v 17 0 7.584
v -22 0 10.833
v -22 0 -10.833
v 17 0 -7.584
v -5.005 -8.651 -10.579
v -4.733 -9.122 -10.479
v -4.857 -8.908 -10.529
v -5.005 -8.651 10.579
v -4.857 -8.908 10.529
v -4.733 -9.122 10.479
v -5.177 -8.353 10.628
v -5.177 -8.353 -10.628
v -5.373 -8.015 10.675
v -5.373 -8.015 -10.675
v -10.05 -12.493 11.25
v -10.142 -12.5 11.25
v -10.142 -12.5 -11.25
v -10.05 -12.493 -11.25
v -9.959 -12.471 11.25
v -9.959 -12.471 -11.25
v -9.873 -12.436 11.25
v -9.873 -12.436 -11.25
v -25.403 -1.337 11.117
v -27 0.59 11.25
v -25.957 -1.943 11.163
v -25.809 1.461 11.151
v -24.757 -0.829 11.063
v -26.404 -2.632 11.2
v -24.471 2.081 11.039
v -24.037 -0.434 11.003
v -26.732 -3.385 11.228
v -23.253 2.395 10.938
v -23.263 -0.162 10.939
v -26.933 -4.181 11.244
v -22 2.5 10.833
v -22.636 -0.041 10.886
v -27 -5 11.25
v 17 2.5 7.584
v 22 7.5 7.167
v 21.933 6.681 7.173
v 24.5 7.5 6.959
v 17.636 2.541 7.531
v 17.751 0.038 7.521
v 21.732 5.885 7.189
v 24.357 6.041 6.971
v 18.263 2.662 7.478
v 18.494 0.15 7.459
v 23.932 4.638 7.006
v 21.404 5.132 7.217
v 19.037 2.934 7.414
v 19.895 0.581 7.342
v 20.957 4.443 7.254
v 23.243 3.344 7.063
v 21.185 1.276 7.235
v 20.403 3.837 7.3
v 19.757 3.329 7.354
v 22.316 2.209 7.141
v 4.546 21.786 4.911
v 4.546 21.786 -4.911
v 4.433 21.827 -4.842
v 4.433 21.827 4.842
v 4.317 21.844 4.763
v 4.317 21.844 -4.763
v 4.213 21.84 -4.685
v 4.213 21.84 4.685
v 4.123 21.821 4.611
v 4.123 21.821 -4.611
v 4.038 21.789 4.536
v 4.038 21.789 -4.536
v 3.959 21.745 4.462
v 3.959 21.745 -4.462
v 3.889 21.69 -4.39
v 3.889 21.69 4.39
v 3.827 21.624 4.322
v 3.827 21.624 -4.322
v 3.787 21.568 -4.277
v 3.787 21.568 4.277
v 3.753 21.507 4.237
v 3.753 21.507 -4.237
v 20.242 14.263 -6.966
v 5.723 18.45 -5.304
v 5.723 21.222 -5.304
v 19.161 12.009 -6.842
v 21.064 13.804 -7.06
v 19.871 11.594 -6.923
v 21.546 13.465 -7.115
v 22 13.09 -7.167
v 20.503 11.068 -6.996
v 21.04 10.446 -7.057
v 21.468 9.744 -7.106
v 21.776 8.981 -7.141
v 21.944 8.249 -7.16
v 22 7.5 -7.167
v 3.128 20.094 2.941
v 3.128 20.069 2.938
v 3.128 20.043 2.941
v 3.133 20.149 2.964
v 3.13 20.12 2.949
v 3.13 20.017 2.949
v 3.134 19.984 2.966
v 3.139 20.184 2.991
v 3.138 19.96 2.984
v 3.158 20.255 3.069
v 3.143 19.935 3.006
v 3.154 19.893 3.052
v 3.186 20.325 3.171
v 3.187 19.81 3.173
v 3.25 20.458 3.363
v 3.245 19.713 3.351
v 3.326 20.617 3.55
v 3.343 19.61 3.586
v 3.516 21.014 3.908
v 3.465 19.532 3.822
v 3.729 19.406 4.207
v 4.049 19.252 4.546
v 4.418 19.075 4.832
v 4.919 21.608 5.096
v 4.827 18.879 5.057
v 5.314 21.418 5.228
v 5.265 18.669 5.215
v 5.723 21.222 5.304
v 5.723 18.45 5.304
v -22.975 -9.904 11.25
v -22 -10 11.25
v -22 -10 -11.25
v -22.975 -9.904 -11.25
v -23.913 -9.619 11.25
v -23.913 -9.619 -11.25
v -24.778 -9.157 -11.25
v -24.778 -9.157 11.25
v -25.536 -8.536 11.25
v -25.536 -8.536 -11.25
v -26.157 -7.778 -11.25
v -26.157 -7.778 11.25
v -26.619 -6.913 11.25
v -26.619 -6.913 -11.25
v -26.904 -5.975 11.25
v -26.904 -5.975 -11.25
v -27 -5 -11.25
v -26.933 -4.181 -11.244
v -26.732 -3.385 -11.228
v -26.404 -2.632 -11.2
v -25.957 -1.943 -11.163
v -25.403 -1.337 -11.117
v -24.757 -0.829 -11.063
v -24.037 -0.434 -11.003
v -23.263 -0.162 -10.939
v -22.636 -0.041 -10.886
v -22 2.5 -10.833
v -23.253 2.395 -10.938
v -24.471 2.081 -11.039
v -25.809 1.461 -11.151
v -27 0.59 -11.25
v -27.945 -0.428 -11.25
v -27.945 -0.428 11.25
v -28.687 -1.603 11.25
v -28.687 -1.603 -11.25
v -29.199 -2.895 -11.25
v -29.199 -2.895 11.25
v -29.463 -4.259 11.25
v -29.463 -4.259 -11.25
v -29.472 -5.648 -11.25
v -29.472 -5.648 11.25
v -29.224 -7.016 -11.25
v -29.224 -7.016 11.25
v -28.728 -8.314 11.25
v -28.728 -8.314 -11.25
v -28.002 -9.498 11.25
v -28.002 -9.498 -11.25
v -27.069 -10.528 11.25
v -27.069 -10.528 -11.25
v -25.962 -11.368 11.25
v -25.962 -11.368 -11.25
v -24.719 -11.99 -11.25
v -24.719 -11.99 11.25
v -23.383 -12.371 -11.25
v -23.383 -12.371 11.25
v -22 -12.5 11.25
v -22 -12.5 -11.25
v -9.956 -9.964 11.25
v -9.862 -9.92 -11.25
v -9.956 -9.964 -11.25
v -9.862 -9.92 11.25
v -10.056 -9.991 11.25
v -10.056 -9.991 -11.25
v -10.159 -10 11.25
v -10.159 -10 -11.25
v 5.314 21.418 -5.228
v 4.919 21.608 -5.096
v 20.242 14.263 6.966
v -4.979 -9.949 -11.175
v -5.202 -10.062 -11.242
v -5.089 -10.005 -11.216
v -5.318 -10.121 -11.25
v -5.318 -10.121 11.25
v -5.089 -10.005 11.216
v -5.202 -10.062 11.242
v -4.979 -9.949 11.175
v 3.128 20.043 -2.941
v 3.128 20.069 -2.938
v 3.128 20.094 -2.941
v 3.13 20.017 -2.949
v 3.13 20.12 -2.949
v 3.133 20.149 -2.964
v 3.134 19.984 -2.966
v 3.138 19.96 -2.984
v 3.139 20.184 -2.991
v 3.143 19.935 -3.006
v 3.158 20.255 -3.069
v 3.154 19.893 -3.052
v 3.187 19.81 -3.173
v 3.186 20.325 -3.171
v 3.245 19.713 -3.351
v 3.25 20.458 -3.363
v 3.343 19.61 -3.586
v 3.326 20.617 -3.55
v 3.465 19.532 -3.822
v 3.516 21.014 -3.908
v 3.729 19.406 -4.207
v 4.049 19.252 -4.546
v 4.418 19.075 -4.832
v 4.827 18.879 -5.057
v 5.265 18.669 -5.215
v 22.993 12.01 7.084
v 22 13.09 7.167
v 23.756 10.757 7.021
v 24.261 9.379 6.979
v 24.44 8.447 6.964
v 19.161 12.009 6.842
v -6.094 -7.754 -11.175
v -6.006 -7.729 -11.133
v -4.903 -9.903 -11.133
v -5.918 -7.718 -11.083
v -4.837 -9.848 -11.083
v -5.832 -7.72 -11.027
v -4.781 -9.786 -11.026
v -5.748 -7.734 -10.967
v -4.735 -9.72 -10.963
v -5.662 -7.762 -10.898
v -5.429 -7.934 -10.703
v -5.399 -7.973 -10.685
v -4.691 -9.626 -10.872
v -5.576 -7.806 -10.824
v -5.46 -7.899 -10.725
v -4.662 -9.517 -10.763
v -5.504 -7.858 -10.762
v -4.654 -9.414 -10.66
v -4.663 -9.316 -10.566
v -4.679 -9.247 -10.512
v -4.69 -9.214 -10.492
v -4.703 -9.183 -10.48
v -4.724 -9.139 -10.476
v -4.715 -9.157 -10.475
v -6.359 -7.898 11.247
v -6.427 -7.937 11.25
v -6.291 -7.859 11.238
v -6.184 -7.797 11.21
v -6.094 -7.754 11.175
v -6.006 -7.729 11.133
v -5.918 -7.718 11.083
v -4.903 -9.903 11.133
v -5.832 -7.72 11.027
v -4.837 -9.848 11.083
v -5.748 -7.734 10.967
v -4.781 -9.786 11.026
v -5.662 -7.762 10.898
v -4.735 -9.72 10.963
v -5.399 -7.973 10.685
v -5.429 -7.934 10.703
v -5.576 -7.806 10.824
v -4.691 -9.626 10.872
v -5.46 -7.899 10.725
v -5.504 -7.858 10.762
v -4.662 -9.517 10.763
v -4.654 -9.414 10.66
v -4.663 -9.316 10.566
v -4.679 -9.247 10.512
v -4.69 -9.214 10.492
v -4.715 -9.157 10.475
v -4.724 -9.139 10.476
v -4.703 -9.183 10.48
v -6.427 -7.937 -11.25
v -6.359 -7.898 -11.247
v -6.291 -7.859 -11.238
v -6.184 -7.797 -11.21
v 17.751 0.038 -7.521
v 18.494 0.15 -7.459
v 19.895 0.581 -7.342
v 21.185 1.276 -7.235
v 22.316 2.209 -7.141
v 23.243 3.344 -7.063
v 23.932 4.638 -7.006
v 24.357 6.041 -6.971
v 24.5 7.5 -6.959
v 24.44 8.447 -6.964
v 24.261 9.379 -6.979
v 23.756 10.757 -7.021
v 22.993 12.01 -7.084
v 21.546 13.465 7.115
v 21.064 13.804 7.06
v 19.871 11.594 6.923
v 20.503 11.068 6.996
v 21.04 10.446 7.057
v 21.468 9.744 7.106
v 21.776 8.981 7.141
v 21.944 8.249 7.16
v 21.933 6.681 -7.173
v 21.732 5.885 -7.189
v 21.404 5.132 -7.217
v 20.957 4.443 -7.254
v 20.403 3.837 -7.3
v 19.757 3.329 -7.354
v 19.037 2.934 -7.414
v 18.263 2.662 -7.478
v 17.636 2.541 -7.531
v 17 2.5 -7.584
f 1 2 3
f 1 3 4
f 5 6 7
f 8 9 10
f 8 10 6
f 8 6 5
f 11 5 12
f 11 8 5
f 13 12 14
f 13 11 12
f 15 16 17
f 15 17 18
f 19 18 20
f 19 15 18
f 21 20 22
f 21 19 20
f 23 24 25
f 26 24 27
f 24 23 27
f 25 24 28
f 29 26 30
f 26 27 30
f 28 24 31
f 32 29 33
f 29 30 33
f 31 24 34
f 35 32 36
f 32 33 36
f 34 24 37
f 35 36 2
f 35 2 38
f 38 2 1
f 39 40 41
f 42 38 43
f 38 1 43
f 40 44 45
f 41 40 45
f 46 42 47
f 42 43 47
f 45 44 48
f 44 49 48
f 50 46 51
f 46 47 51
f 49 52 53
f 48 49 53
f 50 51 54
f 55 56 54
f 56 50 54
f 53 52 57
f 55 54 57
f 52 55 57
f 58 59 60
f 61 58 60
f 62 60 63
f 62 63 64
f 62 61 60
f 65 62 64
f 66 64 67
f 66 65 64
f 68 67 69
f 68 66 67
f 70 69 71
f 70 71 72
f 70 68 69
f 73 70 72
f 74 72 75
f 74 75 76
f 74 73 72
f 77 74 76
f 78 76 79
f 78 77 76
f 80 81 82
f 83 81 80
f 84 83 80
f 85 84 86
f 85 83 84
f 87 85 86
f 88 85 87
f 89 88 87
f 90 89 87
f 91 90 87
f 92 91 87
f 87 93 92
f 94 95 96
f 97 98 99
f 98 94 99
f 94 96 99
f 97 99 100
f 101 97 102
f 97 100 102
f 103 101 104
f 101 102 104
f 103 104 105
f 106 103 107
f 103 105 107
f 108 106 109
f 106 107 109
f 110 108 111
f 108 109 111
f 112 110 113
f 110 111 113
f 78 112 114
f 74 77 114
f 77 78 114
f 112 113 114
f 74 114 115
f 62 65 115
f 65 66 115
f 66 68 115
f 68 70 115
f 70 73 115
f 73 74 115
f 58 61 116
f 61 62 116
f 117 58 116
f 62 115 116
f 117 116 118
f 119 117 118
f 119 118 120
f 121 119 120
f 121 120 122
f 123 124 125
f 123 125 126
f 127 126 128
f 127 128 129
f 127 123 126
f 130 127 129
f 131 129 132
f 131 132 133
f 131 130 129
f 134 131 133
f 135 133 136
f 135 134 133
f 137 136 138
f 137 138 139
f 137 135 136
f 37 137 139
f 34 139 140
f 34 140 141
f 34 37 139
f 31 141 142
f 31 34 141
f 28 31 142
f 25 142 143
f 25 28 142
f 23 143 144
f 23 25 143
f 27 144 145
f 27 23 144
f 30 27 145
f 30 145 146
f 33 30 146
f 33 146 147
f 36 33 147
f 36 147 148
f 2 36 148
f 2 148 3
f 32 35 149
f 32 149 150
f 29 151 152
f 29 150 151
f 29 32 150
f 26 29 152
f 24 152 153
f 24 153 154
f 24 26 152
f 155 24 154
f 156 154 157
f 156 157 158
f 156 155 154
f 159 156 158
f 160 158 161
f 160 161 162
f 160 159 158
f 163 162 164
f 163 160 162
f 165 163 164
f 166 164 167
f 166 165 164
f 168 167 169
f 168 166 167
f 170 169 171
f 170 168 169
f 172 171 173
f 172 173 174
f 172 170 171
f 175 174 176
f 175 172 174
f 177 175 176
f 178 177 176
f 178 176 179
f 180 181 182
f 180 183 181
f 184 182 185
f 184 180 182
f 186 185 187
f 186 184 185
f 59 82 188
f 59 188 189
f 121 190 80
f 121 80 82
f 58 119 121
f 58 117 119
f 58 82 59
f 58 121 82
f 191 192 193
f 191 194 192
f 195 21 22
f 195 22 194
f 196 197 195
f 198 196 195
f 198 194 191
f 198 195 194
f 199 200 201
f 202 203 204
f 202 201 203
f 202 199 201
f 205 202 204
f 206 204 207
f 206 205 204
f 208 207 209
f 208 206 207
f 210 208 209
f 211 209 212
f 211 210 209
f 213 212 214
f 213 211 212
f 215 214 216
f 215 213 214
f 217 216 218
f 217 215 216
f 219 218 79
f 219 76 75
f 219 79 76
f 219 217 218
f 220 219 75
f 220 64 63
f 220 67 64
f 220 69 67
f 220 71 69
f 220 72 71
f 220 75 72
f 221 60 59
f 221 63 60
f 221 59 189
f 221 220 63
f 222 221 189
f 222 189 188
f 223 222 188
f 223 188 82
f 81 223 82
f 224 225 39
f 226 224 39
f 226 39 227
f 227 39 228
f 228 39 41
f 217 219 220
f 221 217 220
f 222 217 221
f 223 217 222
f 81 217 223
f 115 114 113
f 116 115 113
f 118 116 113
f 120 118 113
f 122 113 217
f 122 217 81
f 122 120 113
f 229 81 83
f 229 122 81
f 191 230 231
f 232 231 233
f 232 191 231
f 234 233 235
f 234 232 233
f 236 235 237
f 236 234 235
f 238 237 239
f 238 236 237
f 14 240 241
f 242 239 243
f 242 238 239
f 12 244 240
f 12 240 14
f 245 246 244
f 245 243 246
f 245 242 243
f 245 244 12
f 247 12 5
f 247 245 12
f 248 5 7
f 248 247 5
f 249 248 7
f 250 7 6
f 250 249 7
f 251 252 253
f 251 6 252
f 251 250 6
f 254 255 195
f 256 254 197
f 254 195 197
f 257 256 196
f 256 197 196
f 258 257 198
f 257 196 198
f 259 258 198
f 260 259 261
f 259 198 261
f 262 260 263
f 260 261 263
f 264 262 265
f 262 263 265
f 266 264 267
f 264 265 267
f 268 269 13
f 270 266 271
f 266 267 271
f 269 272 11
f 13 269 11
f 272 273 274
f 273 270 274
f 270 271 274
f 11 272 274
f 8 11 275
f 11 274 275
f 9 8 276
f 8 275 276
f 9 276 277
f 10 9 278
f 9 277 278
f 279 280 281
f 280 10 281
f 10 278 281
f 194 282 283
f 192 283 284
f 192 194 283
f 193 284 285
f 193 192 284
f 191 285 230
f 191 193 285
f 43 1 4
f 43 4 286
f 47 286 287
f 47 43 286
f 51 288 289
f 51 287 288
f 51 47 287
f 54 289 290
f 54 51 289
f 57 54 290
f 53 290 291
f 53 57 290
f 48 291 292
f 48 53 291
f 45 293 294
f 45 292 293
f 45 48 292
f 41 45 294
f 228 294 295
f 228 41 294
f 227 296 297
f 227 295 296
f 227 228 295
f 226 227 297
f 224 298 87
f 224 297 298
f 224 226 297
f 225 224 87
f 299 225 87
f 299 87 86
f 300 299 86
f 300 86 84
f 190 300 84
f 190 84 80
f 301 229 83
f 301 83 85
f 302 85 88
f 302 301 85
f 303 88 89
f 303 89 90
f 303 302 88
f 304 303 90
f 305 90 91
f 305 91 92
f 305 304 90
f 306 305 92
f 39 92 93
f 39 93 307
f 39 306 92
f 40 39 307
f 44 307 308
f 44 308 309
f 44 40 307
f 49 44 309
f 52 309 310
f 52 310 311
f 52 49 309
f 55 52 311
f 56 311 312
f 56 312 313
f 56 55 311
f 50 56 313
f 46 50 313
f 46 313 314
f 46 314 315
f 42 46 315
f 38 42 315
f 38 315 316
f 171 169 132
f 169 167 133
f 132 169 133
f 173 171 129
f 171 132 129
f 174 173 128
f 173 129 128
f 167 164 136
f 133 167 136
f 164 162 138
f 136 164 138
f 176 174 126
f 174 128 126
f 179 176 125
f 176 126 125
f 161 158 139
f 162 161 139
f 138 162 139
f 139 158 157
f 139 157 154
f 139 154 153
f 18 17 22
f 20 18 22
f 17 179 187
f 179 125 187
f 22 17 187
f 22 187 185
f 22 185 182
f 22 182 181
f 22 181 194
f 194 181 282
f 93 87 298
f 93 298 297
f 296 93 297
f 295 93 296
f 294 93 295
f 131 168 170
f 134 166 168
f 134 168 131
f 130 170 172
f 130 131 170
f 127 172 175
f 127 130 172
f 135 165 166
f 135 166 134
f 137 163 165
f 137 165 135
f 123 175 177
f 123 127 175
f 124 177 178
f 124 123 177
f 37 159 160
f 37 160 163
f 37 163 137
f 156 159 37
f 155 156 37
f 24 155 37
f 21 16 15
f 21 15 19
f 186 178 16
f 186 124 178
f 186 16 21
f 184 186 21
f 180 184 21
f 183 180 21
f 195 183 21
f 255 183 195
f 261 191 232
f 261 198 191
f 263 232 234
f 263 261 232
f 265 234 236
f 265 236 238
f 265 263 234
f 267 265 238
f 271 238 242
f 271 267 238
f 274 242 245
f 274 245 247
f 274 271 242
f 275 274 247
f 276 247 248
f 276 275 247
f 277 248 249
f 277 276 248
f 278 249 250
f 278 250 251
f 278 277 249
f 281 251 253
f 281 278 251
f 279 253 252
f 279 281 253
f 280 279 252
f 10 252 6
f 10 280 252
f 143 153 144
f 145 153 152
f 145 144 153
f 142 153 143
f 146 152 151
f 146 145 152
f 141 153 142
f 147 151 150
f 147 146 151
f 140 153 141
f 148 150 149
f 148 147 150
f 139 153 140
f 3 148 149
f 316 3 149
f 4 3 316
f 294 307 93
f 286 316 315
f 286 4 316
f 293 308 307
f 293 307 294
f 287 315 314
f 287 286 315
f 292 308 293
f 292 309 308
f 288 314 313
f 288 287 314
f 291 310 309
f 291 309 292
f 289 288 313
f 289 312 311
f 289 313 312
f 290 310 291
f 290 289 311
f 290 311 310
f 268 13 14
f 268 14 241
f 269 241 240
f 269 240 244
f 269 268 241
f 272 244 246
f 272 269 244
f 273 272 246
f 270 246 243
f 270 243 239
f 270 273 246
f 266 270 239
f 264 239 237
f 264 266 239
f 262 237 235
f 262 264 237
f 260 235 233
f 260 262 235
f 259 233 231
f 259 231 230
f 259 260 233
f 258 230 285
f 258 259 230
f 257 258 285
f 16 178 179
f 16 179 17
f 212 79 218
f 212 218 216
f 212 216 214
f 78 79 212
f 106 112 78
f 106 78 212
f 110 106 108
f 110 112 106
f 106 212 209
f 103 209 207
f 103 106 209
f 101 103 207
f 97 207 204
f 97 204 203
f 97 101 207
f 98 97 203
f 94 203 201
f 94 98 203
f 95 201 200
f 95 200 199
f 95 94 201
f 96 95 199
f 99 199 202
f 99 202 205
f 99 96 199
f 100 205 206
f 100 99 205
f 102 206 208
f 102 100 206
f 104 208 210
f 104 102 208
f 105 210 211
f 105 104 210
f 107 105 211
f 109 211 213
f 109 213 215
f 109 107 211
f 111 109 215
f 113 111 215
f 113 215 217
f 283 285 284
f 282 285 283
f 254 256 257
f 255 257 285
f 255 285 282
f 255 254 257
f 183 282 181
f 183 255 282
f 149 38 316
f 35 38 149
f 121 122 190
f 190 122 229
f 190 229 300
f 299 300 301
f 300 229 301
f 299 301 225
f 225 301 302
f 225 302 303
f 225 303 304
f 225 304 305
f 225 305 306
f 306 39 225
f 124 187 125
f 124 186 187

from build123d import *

# Parameters (mm, degrees)
F1_DEPTH  = 11.25
F4_DEPTH  = 12.5
F8_DEPTH  = 25
F9_DEPTH  = 5
F10_DEPTH = 5


with BuildPart() as f1:
    # F0 (on Top) → F1 (new body)
    with BuildSketch(Plane.XY):
        with BuildLine():
            Line((-22, 0), (0, 0))
            Line((0, 0), (17, 0))
            ThreePointArc((17, 0), (24.313496, 5.837842), (20.24165, 14.263261))
            Line((20.24165, 14.263261), (4.545653, 21.786397))
            ThreePointArc((4.545653, 21.786397), (4.091542, 21.811059), (3.752999, 21.507393))
            Line((3.752999, 21.507393), (3.186098, 20.324631))
            ThreePointArc((3.186098, 20.324631), (3.161436, 19.87052), (3.465103, 19.531977))
            Line((3.465103, 19.531977), (19.1611, 12.008841))
            ThreePointArc((19.1611, 12.008841), (21.875664, 6.391894), (17, 2.5))
            Line((17, 2.5), (-22, 2.5))
            ThreePointArc((-22, 2.5), (-29.5, -5), (-22, -12.5))
            Line((-22, -12.5), (-10.142284, -12.5))
            ThreePointArc((-10.142284, -12.5), (-10.003912, -12.483664), (-9.873148, -12.435554))
            Line((-9.873148, -12.435554), (-4.978775, -9.949009))
            ThreePointArc((-4.978775, -9.949009), (-4.678281, -9.588354), (-4.73332, -9.122157))
            Line((-4.73332, -9.122157), (-5.372774, -8.014591))
            ThreePointArc((-5.372774, -8.014591), (-5.733575, -7.737739), (-6.184464, -7.797099))
            Line((-6.184464, -7.797099), (-9.862116, -9.920392))
            ThreePointArc((-9.862116, -9.920392), (-10.005425, -9.979753), (-10.159215, -10))
            Line((-10.159215, -10), (-22, -10))
            ThreePointArc((-22, -10), (-27, -5), (-22, 0))
        make_face()
    extrude(amount=F1_DEPTH)

    # F3 (on offset) → F4 (cut)
    with BuildSketch(Plane.XZ.offset(5)):
        Polygon((27.003047, 6.75), (27.003047, 15.756967), (-27, 11.25), align=None)
    extrude(amount=-F4_DEPTH, mode=Mode.SUBTRACT)

    # F6 (on offset) → F8 (cut)
    with BuildSketch(Plane.XZ.offset(-7.5)):
        with BuildLine():
            Line((22, 7.166897), (24.5, 6.958576))
            Line((24.5, 6.958576), (25.517887, 14.069991))
            Line((25.517887, 14.069991), (1.366809, 12.402037))
            Line((1.366809, 12.402037), (3.064071, 5))
            Line((3.064071, 5), (3.064071, 2.323721))
            ThreePointArc((3.064071, 2.323721), (3.825408, 4.320816), (5.722997, 5.304269))
            Line((5.722997, 5.304269), (22, 7.166897))
        make_face()
    extrude(amount=-F8_DEPTH, mode=Mode.SUBTRACT)

    # F7 (on face) → F9 (cut)
    with BuildSketch(Plane(origin=(2.996136, -5.897423, 0), x_dir=(0.891541, 0.45294, 0), z_dir=(0.45294, -0.891541, 0))):
        with BuildLine():
            Line((-7.304974, 12.209089), (-10.371014, 11.25))
            Line((-10.371014, 11.25), (-9.32518, 11.25))
            Line((-9.32518, 11.25), (-8.945085, 11.25))
            Line((-8.945085, 11.25), (-8.945085, 11.174948))
            ThreePointArc((-8.945085, 11.174948), (-8.494489, 10.806734), (-8.32518, 10.25))
            Line((-8.32518, 10.25), (-8.32518, 10.173095))
            Line((-8.32518, 10.173095), (-7.304974, 10.173095))
            Line((-7.304974, 10.173095), (-7.304974, 12.209089))
        make_face()
    extrude(amount=-F9_DEPTH, mode=Mode.SUBTRACT)

    # F7 (on face) → F10 (cut)
    with BuildSketch(Plane(origin=(2.996136, -5.897423, 0), x_dir=(0.891541, 0.45294, 0), z_dir=(0.45294, -0.891541, 0))):
        with BuildLine():
            Line((-7.304974, 12.209089), (-10.371014, 11.25))
            Line((-10.371014, 11.25), (-9.32518, 11.25))
            Line((-9.32518, 11.25), (-8.945085, 11.25))
            Line((-8.945085, 11.25), (-8.945085, 11.174948))
            ThreePointArc((-8.945085, 11.174948), (-8.494489, 10.806734), (-8.32518, 10.25))
            Line((-8.32518, 10.25), (-8.32518, 10.173095))
            Line((-8.32518, 10.173095), (-7.304974, 10.173095))
            Line((-7.304974, 10.173095), (-7.304974, 12.209089))
        make_face()
        with BuildLine():
            Line((-8.945085, 11.25), (-9.32518, 11.25))
            ThreePointArc((-9.32518, 11.25), (-9.131463, 11.231057), (-8.945085, 11.174948))
            Line((-8.945085, 11.174948), (-8.945085, 11.25))
        make_face()
    extrude(amount=-F10_DEPTH, mode=Mode.SUBTRACT)

    # F11: F1 across plane


with BuildPart() as f1_1:
    add(f1.part)
    add(f1.part.mirror(Plane.XY))


solid = f1_1.part
